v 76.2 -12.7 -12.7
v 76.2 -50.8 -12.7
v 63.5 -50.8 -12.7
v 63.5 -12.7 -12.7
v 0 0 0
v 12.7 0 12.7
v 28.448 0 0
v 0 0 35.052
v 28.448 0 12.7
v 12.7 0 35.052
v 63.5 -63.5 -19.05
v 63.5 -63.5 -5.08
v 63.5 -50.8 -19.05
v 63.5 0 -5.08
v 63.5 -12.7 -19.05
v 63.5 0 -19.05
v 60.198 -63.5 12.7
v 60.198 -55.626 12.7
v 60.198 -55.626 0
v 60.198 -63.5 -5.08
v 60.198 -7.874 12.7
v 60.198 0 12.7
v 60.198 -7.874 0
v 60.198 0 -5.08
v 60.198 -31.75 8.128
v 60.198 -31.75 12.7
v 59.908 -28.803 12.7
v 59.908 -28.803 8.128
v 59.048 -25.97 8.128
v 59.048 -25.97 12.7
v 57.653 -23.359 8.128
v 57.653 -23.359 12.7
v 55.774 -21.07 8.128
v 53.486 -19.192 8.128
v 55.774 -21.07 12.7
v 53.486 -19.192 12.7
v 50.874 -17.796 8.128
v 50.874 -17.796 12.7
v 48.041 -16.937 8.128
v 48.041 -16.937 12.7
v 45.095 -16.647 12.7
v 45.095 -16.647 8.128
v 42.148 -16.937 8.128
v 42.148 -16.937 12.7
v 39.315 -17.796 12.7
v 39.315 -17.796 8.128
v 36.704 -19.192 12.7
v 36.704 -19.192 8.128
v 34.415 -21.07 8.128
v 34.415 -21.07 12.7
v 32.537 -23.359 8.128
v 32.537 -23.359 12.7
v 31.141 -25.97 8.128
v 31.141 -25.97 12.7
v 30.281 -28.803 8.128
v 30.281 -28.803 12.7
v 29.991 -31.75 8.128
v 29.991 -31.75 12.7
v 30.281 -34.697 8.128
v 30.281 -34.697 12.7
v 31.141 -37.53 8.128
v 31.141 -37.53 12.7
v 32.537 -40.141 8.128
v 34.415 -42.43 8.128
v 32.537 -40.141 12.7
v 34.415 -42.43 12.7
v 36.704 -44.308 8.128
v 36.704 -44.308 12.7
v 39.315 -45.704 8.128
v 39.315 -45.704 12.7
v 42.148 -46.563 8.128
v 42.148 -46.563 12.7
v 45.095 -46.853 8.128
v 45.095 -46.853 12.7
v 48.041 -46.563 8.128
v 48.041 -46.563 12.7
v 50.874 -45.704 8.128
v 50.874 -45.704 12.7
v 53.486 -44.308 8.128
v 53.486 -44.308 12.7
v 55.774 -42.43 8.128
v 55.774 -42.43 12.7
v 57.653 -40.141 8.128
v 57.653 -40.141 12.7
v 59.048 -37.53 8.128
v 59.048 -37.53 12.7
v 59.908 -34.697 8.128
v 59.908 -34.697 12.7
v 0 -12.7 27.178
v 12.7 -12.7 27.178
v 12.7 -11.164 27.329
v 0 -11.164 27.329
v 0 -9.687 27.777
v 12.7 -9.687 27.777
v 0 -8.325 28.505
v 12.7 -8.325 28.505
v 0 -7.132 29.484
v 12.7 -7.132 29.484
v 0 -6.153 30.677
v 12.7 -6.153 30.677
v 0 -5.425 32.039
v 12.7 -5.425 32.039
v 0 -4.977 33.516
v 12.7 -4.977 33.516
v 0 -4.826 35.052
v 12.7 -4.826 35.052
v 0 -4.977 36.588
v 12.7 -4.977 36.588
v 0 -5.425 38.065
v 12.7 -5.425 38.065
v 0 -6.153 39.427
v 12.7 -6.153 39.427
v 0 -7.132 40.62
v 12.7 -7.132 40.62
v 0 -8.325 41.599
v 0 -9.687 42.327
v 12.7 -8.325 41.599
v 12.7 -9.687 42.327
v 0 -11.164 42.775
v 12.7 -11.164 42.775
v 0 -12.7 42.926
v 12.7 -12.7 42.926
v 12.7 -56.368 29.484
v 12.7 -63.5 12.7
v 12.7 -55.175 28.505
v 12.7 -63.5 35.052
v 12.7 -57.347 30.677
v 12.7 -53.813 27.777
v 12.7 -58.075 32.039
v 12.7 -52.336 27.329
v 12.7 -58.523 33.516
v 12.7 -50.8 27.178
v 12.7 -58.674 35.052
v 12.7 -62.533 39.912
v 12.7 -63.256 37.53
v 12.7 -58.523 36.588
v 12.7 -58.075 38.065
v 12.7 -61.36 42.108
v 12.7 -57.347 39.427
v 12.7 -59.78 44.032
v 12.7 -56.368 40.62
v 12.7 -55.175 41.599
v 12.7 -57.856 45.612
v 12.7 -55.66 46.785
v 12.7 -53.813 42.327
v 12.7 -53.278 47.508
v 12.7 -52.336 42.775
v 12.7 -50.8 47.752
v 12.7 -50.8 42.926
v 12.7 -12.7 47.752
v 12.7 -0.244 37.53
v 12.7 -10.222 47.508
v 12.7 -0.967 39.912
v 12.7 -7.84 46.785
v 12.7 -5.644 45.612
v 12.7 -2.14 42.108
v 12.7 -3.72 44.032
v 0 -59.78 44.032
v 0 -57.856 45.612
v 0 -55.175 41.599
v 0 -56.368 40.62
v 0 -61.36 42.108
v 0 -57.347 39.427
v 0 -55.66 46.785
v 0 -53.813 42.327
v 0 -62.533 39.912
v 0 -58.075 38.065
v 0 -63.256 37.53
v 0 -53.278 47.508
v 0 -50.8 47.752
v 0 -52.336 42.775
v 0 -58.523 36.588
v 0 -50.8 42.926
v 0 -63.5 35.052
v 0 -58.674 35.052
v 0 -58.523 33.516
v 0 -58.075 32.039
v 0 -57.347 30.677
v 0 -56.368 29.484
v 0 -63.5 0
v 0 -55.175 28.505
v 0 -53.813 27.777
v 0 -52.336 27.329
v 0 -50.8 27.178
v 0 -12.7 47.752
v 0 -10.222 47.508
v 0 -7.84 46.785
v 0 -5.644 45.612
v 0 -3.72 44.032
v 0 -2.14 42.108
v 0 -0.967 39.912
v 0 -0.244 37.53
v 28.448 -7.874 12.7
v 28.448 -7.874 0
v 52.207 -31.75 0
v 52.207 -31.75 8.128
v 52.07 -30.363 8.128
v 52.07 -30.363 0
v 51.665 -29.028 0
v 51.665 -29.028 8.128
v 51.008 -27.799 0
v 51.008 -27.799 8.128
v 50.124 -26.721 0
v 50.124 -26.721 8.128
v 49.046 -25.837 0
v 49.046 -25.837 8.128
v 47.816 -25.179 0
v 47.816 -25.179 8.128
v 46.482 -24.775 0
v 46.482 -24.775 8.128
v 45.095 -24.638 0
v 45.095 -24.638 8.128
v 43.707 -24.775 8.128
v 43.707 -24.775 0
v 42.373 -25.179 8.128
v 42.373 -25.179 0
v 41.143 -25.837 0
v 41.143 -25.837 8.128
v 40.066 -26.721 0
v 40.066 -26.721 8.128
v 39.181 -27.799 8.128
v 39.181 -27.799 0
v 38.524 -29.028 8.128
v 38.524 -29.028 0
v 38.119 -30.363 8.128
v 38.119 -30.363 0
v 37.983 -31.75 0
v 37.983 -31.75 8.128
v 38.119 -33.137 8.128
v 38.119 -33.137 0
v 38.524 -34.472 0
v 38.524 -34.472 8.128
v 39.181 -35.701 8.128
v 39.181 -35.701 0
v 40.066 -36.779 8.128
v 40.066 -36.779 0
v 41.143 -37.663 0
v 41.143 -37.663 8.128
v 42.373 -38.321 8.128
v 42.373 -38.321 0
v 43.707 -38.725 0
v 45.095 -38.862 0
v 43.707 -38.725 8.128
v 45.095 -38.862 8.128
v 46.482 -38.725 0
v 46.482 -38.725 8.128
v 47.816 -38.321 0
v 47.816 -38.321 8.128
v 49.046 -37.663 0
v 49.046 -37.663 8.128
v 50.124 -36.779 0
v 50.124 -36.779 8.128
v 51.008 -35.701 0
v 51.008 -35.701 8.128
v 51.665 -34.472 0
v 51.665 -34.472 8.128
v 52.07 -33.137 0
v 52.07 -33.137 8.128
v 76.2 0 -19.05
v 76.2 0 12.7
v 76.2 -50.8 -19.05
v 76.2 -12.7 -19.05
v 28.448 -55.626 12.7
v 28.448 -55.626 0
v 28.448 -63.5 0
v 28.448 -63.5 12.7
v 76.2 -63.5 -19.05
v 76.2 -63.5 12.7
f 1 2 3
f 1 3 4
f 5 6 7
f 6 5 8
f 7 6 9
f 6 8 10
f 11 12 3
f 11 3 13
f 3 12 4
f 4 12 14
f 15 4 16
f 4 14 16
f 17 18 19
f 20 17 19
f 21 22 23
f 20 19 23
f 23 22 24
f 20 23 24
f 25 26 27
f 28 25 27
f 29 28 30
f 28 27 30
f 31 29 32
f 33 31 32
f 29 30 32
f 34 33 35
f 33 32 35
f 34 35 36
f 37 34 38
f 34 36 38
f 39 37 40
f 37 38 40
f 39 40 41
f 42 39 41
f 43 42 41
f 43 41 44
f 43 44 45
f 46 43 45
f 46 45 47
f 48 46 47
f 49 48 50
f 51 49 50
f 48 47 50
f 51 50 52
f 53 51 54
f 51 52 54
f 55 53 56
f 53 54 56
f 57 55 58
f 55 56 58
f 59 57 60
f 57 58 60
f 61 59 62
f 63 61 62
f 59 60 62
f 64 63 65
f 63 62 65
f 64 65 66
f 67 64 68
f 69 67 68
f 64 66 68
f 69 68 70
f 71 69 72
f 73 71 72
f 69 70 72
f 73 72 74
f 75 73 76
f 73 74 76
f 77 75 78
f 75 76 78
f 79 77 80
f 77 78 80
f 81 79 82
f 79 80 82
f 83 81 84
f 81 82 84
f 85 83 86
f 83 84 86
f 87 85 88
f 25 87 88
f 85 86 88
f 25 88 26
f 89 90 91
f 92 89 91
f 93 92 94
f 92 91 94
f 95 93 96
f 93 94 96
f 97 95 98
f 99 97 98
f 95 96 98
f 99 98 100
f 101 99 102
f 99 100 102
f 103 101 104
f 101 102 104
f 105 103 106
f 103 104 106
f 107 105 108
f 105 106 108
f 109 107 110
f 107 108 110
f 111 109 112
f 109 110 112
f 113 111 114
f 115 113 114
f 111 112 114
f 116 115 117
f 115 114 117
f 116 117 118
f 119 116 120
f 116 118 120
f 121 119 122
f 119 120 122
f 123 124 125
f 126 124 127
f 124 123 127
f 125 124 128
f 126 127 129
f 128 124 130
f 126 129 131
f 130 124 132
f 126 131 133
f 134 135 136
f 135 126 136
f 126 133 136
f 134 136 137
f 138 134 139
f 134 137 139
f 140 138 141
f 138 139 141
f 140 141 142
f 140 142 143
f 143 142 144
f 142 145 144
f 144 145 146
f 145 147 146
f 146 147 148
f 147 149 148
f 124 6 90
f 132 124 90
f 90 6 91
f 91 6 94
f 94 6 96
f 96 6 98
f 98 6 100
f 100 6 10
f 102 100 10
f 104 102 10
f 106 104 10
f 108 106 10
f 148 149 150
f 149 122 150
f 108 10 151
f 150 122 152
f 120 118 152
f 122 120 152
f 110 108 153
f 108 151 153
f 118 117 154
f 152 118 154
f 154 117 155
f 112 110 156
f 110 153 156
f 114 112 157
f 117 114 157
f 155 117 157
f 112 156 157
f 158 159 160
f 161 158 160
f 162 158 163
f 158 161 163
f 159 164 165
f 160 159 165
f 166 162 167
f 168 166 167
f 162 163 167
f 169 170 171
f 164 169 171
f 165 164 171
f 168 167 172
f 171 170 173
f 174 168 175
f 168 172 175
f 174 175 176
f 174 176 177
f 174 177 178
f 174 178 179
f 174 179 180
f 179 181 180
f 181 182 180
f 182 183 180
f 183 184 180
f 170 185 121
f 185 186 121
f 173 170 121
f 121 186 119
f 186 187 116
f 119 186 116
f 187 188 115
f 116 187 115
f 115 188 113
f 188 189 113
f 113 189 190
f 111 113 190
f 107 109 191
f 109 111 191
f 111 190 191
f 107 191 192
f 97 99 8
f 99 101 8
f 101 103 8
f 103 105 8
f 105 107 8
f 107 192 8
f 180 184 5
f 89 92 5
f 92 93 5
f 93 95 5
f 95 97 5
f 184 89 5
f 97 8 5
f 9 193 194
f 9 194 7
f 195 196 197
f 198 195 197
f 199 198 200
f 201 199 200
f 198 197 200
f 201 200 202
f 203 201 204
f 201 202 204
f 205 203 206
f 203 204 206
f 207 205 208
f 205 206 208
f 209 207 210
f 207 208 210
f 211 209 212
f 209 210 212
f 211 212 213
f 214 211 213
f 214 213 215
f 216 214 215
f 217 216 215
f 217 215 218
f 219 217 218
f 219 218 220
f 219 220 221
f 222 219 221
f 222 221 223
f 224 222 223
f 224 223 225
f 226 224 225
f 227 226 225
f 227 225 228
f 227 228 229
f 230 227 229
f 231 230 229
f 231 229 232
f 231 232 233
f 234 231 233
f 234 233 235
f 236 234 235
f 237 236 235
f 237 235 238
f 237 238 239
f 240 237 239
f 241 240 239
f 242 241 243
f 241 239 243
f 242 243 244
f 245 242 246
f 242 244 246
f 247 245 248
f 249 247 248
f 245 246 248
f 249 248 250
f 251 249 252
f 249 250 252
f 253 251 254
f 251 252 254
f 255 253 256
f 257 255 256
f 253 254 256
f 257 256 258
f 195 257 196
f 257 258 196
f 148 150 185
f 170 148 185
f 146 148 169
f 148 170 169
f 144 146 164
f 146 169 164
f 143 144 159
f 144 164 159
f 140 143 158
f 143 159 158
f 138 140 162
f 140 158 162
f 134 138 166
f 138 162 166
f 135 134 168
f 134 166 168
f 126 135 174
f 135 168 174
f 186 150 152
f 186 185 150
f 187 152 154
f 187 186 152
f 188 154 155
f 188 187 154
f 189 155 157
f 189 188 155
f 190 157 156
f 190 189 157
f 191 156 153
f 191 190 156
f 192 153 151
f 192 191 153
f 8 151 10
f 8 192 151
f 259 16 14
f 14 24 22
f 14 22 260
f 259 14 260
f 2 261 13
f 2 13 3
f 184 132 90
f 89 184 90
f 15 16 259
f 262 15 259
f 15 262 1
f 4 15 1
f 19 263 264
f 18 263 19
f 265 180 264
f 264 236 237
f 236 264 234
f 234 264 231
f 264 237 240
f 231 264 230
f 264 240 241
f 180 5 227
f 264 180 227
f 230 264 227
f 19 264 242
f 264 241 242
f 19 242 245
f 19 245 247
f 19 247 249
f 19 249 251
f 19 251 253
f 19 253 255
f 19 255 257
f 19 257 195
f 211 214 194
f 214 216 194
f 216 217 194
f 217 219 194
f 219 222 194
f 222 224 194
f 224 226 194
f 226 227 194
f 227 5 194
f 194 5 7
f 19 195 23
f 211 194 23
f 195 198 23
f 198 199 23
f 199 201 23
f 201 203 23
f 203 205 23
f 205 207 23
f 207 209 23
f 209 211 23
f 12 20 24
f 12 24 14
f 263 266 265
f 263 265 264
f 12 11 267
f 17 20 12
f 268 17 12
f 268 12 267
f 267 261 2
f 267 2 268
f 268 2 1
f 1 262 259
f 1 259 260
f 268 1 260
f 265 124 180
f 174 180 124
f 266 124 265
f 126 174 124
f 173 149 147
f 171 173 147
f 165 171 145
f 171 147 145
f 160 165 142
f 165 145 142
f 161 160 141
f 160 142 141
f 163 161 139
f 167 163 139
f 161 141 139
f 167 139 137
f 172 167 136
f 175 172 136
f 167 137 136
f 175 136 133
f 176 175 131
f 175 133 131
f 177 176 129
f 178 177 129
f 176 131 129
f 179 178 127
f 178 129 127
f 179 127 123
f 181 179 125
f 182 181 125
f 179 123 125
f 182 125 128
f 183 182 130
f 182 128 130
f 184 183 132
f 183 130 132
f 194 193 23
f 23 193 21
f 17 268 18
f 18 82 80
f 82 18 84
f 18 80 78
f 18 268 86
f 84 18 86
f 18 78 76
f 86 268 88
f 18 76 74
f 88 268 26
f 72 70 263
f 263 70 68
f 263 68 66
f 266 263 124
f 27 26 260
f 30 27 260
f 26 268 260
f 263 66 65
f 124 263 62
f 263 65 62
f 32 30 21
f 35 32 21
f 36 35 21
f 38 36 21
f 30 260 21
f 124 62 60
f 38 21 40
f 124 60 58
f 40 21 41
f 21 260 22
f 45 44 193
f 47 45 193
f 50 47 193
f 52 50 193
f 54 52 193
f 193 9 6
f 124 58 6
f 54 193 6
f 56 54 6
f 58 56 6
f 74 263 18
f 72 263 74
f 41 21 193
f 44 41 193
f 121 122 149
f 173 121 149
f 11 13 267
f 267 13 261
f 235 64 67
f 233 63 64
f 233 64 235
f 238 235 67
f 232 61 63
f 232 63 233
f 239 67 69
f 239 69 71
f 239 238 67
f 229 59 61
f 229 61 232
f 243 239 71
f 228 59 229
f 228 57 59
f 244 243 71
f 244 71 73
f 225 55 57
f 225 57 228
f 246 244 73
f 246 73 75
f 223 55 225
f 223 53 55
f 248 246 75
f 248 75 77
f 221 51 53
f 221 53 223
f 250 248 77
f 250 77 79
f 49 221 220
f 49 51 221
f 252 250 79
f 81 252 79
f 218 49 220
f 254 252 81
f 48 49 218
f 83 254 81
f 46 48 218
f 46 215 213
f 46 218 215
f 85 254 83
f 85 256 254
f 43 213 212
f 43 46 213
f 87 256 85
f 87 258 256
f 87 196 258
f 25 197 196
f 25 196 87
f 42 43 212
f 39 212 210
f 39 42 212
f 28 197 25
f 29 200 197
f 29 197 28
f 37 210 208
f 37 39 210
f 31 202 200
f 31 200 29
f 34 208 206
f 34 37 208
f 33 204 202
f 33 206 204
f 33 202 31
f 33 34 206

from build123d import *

# Parameters (mm, degrees)
F1_DEPTH  = 63.5
F2_R      = 12.7
F3_W      = 38.1
F3_H      = 6.35
F4_DEPTH  = 25.4
F5_W      = 31.75
F5_H      = 7.874
F6_DEPTH  = 25.4
F8_R      = 15.103409
F9_DEPTH  = 4.572
F10_R     = 7.112
F11_DEPTH = 27.179
F12_DEPTH = 25.4
F13_DEPTH = 12.701


with BuildPart() as f1:
    # F0 (on Front) → F1 (new body)
    with BuildSketch(Plane.XZ):
        Polygon((0, 47.752), (0, 0), (60.198, 0), (60.198, -5.08), (63.5, -5.08), (63.5, -19.05), (76.2, -19.05), (76.2, 12.7), (12.7, 12.7), (12.7, 47.752), align=None)
    extrude(amount=F1_DEPTH)

    # F2
    f2_edges = [f1.edges().sort_by_distance(p)[0] for p in [
        (6.35, -63.5, 47.752),
        (6.35, 0, 47.752),
    ]]
    fillet(f2_edges, radius=F2_R)

    # F3 (on face) → F4 (cut)
    with BuildSketch(Plane.YZ.offset(76.2)):
        with Locations((-31.75, -15.875)):
            Rectangle(F3_W, F3_H)
    extrude(amount=-F4_DEPTH, mode=Mode.SUBTRACT)

    # F5 (on face) → F6 (cut)
    with BuildSketch(Plane.XY.offset(12.7)):
        with Locations((44.323, -59.563)):
            Rectangle(F5_W, F5_H)
        with Locations((44.323, -3.937)):
            Rectangle(F5_W, F5_H)
    extrude(amount=-F6_DEPTH, mode=Mode.SUBTRACT)

    # F8 (on face) → F9 (cut)
    with BuildSketch(Plane.XY.offset(12.7)):
        with Locations((45.094591, -31.75)):
            Circle(F8_R)
    extrude(amount=-F9_DEPTH, mode=Mode.SUBTRACT)

    # F10 (on face) → F11 (cut, through all)
    with BuildSketch(Plane.XY.offset(8.128)):
        with Locations((45.094591, -31.75)):
            Circle(F10_R)
    extrude(amount=-F11_DEPTH, mode=Mode.SUBTRACT)

    # F7 (on face) → F12 (cut)
    with BuildSketch(Plane.YZ.offset(12.7)):
        with BuildLine():
            Line((-12.7, 42.926), (-50.8, 42.926))
            ThreePointArc((-50.8, 42.926), (-58.674, 35.052), (-50.8, 27.178))
            Line((-50.8, 27.178), (-12.7, 27.178))
            ThreePointArc((-12.7, 27.178), (-4.826, 35.052), (-12.7, 42.926))
        make_face()
    extrude(amount=-F12_DEPTH, mode=Mode.SUBTRACT)

    # F7 (on face) → F13 (cut, through all)
    with BuildSketch(Plane.YZ.offset(12.7)):
        with BuildLine():
            Line((-12.7, 42.926), (-50.8, 42.926))
            ThreePointArc((-50.8, 42.926), (-58.674, 35.052), (-50.8, 27.178))
            Line((-50.8, 27.178), (-12.7, 27.178))
            ThreePointArc((-12.7, 27.178), (-4.826, 35.052), (-12.7, 42.926))
        make_face()
    extrude(amount=-F13_DEPTH, mode=Mode.SUBTRACT)


solid = f1.part
